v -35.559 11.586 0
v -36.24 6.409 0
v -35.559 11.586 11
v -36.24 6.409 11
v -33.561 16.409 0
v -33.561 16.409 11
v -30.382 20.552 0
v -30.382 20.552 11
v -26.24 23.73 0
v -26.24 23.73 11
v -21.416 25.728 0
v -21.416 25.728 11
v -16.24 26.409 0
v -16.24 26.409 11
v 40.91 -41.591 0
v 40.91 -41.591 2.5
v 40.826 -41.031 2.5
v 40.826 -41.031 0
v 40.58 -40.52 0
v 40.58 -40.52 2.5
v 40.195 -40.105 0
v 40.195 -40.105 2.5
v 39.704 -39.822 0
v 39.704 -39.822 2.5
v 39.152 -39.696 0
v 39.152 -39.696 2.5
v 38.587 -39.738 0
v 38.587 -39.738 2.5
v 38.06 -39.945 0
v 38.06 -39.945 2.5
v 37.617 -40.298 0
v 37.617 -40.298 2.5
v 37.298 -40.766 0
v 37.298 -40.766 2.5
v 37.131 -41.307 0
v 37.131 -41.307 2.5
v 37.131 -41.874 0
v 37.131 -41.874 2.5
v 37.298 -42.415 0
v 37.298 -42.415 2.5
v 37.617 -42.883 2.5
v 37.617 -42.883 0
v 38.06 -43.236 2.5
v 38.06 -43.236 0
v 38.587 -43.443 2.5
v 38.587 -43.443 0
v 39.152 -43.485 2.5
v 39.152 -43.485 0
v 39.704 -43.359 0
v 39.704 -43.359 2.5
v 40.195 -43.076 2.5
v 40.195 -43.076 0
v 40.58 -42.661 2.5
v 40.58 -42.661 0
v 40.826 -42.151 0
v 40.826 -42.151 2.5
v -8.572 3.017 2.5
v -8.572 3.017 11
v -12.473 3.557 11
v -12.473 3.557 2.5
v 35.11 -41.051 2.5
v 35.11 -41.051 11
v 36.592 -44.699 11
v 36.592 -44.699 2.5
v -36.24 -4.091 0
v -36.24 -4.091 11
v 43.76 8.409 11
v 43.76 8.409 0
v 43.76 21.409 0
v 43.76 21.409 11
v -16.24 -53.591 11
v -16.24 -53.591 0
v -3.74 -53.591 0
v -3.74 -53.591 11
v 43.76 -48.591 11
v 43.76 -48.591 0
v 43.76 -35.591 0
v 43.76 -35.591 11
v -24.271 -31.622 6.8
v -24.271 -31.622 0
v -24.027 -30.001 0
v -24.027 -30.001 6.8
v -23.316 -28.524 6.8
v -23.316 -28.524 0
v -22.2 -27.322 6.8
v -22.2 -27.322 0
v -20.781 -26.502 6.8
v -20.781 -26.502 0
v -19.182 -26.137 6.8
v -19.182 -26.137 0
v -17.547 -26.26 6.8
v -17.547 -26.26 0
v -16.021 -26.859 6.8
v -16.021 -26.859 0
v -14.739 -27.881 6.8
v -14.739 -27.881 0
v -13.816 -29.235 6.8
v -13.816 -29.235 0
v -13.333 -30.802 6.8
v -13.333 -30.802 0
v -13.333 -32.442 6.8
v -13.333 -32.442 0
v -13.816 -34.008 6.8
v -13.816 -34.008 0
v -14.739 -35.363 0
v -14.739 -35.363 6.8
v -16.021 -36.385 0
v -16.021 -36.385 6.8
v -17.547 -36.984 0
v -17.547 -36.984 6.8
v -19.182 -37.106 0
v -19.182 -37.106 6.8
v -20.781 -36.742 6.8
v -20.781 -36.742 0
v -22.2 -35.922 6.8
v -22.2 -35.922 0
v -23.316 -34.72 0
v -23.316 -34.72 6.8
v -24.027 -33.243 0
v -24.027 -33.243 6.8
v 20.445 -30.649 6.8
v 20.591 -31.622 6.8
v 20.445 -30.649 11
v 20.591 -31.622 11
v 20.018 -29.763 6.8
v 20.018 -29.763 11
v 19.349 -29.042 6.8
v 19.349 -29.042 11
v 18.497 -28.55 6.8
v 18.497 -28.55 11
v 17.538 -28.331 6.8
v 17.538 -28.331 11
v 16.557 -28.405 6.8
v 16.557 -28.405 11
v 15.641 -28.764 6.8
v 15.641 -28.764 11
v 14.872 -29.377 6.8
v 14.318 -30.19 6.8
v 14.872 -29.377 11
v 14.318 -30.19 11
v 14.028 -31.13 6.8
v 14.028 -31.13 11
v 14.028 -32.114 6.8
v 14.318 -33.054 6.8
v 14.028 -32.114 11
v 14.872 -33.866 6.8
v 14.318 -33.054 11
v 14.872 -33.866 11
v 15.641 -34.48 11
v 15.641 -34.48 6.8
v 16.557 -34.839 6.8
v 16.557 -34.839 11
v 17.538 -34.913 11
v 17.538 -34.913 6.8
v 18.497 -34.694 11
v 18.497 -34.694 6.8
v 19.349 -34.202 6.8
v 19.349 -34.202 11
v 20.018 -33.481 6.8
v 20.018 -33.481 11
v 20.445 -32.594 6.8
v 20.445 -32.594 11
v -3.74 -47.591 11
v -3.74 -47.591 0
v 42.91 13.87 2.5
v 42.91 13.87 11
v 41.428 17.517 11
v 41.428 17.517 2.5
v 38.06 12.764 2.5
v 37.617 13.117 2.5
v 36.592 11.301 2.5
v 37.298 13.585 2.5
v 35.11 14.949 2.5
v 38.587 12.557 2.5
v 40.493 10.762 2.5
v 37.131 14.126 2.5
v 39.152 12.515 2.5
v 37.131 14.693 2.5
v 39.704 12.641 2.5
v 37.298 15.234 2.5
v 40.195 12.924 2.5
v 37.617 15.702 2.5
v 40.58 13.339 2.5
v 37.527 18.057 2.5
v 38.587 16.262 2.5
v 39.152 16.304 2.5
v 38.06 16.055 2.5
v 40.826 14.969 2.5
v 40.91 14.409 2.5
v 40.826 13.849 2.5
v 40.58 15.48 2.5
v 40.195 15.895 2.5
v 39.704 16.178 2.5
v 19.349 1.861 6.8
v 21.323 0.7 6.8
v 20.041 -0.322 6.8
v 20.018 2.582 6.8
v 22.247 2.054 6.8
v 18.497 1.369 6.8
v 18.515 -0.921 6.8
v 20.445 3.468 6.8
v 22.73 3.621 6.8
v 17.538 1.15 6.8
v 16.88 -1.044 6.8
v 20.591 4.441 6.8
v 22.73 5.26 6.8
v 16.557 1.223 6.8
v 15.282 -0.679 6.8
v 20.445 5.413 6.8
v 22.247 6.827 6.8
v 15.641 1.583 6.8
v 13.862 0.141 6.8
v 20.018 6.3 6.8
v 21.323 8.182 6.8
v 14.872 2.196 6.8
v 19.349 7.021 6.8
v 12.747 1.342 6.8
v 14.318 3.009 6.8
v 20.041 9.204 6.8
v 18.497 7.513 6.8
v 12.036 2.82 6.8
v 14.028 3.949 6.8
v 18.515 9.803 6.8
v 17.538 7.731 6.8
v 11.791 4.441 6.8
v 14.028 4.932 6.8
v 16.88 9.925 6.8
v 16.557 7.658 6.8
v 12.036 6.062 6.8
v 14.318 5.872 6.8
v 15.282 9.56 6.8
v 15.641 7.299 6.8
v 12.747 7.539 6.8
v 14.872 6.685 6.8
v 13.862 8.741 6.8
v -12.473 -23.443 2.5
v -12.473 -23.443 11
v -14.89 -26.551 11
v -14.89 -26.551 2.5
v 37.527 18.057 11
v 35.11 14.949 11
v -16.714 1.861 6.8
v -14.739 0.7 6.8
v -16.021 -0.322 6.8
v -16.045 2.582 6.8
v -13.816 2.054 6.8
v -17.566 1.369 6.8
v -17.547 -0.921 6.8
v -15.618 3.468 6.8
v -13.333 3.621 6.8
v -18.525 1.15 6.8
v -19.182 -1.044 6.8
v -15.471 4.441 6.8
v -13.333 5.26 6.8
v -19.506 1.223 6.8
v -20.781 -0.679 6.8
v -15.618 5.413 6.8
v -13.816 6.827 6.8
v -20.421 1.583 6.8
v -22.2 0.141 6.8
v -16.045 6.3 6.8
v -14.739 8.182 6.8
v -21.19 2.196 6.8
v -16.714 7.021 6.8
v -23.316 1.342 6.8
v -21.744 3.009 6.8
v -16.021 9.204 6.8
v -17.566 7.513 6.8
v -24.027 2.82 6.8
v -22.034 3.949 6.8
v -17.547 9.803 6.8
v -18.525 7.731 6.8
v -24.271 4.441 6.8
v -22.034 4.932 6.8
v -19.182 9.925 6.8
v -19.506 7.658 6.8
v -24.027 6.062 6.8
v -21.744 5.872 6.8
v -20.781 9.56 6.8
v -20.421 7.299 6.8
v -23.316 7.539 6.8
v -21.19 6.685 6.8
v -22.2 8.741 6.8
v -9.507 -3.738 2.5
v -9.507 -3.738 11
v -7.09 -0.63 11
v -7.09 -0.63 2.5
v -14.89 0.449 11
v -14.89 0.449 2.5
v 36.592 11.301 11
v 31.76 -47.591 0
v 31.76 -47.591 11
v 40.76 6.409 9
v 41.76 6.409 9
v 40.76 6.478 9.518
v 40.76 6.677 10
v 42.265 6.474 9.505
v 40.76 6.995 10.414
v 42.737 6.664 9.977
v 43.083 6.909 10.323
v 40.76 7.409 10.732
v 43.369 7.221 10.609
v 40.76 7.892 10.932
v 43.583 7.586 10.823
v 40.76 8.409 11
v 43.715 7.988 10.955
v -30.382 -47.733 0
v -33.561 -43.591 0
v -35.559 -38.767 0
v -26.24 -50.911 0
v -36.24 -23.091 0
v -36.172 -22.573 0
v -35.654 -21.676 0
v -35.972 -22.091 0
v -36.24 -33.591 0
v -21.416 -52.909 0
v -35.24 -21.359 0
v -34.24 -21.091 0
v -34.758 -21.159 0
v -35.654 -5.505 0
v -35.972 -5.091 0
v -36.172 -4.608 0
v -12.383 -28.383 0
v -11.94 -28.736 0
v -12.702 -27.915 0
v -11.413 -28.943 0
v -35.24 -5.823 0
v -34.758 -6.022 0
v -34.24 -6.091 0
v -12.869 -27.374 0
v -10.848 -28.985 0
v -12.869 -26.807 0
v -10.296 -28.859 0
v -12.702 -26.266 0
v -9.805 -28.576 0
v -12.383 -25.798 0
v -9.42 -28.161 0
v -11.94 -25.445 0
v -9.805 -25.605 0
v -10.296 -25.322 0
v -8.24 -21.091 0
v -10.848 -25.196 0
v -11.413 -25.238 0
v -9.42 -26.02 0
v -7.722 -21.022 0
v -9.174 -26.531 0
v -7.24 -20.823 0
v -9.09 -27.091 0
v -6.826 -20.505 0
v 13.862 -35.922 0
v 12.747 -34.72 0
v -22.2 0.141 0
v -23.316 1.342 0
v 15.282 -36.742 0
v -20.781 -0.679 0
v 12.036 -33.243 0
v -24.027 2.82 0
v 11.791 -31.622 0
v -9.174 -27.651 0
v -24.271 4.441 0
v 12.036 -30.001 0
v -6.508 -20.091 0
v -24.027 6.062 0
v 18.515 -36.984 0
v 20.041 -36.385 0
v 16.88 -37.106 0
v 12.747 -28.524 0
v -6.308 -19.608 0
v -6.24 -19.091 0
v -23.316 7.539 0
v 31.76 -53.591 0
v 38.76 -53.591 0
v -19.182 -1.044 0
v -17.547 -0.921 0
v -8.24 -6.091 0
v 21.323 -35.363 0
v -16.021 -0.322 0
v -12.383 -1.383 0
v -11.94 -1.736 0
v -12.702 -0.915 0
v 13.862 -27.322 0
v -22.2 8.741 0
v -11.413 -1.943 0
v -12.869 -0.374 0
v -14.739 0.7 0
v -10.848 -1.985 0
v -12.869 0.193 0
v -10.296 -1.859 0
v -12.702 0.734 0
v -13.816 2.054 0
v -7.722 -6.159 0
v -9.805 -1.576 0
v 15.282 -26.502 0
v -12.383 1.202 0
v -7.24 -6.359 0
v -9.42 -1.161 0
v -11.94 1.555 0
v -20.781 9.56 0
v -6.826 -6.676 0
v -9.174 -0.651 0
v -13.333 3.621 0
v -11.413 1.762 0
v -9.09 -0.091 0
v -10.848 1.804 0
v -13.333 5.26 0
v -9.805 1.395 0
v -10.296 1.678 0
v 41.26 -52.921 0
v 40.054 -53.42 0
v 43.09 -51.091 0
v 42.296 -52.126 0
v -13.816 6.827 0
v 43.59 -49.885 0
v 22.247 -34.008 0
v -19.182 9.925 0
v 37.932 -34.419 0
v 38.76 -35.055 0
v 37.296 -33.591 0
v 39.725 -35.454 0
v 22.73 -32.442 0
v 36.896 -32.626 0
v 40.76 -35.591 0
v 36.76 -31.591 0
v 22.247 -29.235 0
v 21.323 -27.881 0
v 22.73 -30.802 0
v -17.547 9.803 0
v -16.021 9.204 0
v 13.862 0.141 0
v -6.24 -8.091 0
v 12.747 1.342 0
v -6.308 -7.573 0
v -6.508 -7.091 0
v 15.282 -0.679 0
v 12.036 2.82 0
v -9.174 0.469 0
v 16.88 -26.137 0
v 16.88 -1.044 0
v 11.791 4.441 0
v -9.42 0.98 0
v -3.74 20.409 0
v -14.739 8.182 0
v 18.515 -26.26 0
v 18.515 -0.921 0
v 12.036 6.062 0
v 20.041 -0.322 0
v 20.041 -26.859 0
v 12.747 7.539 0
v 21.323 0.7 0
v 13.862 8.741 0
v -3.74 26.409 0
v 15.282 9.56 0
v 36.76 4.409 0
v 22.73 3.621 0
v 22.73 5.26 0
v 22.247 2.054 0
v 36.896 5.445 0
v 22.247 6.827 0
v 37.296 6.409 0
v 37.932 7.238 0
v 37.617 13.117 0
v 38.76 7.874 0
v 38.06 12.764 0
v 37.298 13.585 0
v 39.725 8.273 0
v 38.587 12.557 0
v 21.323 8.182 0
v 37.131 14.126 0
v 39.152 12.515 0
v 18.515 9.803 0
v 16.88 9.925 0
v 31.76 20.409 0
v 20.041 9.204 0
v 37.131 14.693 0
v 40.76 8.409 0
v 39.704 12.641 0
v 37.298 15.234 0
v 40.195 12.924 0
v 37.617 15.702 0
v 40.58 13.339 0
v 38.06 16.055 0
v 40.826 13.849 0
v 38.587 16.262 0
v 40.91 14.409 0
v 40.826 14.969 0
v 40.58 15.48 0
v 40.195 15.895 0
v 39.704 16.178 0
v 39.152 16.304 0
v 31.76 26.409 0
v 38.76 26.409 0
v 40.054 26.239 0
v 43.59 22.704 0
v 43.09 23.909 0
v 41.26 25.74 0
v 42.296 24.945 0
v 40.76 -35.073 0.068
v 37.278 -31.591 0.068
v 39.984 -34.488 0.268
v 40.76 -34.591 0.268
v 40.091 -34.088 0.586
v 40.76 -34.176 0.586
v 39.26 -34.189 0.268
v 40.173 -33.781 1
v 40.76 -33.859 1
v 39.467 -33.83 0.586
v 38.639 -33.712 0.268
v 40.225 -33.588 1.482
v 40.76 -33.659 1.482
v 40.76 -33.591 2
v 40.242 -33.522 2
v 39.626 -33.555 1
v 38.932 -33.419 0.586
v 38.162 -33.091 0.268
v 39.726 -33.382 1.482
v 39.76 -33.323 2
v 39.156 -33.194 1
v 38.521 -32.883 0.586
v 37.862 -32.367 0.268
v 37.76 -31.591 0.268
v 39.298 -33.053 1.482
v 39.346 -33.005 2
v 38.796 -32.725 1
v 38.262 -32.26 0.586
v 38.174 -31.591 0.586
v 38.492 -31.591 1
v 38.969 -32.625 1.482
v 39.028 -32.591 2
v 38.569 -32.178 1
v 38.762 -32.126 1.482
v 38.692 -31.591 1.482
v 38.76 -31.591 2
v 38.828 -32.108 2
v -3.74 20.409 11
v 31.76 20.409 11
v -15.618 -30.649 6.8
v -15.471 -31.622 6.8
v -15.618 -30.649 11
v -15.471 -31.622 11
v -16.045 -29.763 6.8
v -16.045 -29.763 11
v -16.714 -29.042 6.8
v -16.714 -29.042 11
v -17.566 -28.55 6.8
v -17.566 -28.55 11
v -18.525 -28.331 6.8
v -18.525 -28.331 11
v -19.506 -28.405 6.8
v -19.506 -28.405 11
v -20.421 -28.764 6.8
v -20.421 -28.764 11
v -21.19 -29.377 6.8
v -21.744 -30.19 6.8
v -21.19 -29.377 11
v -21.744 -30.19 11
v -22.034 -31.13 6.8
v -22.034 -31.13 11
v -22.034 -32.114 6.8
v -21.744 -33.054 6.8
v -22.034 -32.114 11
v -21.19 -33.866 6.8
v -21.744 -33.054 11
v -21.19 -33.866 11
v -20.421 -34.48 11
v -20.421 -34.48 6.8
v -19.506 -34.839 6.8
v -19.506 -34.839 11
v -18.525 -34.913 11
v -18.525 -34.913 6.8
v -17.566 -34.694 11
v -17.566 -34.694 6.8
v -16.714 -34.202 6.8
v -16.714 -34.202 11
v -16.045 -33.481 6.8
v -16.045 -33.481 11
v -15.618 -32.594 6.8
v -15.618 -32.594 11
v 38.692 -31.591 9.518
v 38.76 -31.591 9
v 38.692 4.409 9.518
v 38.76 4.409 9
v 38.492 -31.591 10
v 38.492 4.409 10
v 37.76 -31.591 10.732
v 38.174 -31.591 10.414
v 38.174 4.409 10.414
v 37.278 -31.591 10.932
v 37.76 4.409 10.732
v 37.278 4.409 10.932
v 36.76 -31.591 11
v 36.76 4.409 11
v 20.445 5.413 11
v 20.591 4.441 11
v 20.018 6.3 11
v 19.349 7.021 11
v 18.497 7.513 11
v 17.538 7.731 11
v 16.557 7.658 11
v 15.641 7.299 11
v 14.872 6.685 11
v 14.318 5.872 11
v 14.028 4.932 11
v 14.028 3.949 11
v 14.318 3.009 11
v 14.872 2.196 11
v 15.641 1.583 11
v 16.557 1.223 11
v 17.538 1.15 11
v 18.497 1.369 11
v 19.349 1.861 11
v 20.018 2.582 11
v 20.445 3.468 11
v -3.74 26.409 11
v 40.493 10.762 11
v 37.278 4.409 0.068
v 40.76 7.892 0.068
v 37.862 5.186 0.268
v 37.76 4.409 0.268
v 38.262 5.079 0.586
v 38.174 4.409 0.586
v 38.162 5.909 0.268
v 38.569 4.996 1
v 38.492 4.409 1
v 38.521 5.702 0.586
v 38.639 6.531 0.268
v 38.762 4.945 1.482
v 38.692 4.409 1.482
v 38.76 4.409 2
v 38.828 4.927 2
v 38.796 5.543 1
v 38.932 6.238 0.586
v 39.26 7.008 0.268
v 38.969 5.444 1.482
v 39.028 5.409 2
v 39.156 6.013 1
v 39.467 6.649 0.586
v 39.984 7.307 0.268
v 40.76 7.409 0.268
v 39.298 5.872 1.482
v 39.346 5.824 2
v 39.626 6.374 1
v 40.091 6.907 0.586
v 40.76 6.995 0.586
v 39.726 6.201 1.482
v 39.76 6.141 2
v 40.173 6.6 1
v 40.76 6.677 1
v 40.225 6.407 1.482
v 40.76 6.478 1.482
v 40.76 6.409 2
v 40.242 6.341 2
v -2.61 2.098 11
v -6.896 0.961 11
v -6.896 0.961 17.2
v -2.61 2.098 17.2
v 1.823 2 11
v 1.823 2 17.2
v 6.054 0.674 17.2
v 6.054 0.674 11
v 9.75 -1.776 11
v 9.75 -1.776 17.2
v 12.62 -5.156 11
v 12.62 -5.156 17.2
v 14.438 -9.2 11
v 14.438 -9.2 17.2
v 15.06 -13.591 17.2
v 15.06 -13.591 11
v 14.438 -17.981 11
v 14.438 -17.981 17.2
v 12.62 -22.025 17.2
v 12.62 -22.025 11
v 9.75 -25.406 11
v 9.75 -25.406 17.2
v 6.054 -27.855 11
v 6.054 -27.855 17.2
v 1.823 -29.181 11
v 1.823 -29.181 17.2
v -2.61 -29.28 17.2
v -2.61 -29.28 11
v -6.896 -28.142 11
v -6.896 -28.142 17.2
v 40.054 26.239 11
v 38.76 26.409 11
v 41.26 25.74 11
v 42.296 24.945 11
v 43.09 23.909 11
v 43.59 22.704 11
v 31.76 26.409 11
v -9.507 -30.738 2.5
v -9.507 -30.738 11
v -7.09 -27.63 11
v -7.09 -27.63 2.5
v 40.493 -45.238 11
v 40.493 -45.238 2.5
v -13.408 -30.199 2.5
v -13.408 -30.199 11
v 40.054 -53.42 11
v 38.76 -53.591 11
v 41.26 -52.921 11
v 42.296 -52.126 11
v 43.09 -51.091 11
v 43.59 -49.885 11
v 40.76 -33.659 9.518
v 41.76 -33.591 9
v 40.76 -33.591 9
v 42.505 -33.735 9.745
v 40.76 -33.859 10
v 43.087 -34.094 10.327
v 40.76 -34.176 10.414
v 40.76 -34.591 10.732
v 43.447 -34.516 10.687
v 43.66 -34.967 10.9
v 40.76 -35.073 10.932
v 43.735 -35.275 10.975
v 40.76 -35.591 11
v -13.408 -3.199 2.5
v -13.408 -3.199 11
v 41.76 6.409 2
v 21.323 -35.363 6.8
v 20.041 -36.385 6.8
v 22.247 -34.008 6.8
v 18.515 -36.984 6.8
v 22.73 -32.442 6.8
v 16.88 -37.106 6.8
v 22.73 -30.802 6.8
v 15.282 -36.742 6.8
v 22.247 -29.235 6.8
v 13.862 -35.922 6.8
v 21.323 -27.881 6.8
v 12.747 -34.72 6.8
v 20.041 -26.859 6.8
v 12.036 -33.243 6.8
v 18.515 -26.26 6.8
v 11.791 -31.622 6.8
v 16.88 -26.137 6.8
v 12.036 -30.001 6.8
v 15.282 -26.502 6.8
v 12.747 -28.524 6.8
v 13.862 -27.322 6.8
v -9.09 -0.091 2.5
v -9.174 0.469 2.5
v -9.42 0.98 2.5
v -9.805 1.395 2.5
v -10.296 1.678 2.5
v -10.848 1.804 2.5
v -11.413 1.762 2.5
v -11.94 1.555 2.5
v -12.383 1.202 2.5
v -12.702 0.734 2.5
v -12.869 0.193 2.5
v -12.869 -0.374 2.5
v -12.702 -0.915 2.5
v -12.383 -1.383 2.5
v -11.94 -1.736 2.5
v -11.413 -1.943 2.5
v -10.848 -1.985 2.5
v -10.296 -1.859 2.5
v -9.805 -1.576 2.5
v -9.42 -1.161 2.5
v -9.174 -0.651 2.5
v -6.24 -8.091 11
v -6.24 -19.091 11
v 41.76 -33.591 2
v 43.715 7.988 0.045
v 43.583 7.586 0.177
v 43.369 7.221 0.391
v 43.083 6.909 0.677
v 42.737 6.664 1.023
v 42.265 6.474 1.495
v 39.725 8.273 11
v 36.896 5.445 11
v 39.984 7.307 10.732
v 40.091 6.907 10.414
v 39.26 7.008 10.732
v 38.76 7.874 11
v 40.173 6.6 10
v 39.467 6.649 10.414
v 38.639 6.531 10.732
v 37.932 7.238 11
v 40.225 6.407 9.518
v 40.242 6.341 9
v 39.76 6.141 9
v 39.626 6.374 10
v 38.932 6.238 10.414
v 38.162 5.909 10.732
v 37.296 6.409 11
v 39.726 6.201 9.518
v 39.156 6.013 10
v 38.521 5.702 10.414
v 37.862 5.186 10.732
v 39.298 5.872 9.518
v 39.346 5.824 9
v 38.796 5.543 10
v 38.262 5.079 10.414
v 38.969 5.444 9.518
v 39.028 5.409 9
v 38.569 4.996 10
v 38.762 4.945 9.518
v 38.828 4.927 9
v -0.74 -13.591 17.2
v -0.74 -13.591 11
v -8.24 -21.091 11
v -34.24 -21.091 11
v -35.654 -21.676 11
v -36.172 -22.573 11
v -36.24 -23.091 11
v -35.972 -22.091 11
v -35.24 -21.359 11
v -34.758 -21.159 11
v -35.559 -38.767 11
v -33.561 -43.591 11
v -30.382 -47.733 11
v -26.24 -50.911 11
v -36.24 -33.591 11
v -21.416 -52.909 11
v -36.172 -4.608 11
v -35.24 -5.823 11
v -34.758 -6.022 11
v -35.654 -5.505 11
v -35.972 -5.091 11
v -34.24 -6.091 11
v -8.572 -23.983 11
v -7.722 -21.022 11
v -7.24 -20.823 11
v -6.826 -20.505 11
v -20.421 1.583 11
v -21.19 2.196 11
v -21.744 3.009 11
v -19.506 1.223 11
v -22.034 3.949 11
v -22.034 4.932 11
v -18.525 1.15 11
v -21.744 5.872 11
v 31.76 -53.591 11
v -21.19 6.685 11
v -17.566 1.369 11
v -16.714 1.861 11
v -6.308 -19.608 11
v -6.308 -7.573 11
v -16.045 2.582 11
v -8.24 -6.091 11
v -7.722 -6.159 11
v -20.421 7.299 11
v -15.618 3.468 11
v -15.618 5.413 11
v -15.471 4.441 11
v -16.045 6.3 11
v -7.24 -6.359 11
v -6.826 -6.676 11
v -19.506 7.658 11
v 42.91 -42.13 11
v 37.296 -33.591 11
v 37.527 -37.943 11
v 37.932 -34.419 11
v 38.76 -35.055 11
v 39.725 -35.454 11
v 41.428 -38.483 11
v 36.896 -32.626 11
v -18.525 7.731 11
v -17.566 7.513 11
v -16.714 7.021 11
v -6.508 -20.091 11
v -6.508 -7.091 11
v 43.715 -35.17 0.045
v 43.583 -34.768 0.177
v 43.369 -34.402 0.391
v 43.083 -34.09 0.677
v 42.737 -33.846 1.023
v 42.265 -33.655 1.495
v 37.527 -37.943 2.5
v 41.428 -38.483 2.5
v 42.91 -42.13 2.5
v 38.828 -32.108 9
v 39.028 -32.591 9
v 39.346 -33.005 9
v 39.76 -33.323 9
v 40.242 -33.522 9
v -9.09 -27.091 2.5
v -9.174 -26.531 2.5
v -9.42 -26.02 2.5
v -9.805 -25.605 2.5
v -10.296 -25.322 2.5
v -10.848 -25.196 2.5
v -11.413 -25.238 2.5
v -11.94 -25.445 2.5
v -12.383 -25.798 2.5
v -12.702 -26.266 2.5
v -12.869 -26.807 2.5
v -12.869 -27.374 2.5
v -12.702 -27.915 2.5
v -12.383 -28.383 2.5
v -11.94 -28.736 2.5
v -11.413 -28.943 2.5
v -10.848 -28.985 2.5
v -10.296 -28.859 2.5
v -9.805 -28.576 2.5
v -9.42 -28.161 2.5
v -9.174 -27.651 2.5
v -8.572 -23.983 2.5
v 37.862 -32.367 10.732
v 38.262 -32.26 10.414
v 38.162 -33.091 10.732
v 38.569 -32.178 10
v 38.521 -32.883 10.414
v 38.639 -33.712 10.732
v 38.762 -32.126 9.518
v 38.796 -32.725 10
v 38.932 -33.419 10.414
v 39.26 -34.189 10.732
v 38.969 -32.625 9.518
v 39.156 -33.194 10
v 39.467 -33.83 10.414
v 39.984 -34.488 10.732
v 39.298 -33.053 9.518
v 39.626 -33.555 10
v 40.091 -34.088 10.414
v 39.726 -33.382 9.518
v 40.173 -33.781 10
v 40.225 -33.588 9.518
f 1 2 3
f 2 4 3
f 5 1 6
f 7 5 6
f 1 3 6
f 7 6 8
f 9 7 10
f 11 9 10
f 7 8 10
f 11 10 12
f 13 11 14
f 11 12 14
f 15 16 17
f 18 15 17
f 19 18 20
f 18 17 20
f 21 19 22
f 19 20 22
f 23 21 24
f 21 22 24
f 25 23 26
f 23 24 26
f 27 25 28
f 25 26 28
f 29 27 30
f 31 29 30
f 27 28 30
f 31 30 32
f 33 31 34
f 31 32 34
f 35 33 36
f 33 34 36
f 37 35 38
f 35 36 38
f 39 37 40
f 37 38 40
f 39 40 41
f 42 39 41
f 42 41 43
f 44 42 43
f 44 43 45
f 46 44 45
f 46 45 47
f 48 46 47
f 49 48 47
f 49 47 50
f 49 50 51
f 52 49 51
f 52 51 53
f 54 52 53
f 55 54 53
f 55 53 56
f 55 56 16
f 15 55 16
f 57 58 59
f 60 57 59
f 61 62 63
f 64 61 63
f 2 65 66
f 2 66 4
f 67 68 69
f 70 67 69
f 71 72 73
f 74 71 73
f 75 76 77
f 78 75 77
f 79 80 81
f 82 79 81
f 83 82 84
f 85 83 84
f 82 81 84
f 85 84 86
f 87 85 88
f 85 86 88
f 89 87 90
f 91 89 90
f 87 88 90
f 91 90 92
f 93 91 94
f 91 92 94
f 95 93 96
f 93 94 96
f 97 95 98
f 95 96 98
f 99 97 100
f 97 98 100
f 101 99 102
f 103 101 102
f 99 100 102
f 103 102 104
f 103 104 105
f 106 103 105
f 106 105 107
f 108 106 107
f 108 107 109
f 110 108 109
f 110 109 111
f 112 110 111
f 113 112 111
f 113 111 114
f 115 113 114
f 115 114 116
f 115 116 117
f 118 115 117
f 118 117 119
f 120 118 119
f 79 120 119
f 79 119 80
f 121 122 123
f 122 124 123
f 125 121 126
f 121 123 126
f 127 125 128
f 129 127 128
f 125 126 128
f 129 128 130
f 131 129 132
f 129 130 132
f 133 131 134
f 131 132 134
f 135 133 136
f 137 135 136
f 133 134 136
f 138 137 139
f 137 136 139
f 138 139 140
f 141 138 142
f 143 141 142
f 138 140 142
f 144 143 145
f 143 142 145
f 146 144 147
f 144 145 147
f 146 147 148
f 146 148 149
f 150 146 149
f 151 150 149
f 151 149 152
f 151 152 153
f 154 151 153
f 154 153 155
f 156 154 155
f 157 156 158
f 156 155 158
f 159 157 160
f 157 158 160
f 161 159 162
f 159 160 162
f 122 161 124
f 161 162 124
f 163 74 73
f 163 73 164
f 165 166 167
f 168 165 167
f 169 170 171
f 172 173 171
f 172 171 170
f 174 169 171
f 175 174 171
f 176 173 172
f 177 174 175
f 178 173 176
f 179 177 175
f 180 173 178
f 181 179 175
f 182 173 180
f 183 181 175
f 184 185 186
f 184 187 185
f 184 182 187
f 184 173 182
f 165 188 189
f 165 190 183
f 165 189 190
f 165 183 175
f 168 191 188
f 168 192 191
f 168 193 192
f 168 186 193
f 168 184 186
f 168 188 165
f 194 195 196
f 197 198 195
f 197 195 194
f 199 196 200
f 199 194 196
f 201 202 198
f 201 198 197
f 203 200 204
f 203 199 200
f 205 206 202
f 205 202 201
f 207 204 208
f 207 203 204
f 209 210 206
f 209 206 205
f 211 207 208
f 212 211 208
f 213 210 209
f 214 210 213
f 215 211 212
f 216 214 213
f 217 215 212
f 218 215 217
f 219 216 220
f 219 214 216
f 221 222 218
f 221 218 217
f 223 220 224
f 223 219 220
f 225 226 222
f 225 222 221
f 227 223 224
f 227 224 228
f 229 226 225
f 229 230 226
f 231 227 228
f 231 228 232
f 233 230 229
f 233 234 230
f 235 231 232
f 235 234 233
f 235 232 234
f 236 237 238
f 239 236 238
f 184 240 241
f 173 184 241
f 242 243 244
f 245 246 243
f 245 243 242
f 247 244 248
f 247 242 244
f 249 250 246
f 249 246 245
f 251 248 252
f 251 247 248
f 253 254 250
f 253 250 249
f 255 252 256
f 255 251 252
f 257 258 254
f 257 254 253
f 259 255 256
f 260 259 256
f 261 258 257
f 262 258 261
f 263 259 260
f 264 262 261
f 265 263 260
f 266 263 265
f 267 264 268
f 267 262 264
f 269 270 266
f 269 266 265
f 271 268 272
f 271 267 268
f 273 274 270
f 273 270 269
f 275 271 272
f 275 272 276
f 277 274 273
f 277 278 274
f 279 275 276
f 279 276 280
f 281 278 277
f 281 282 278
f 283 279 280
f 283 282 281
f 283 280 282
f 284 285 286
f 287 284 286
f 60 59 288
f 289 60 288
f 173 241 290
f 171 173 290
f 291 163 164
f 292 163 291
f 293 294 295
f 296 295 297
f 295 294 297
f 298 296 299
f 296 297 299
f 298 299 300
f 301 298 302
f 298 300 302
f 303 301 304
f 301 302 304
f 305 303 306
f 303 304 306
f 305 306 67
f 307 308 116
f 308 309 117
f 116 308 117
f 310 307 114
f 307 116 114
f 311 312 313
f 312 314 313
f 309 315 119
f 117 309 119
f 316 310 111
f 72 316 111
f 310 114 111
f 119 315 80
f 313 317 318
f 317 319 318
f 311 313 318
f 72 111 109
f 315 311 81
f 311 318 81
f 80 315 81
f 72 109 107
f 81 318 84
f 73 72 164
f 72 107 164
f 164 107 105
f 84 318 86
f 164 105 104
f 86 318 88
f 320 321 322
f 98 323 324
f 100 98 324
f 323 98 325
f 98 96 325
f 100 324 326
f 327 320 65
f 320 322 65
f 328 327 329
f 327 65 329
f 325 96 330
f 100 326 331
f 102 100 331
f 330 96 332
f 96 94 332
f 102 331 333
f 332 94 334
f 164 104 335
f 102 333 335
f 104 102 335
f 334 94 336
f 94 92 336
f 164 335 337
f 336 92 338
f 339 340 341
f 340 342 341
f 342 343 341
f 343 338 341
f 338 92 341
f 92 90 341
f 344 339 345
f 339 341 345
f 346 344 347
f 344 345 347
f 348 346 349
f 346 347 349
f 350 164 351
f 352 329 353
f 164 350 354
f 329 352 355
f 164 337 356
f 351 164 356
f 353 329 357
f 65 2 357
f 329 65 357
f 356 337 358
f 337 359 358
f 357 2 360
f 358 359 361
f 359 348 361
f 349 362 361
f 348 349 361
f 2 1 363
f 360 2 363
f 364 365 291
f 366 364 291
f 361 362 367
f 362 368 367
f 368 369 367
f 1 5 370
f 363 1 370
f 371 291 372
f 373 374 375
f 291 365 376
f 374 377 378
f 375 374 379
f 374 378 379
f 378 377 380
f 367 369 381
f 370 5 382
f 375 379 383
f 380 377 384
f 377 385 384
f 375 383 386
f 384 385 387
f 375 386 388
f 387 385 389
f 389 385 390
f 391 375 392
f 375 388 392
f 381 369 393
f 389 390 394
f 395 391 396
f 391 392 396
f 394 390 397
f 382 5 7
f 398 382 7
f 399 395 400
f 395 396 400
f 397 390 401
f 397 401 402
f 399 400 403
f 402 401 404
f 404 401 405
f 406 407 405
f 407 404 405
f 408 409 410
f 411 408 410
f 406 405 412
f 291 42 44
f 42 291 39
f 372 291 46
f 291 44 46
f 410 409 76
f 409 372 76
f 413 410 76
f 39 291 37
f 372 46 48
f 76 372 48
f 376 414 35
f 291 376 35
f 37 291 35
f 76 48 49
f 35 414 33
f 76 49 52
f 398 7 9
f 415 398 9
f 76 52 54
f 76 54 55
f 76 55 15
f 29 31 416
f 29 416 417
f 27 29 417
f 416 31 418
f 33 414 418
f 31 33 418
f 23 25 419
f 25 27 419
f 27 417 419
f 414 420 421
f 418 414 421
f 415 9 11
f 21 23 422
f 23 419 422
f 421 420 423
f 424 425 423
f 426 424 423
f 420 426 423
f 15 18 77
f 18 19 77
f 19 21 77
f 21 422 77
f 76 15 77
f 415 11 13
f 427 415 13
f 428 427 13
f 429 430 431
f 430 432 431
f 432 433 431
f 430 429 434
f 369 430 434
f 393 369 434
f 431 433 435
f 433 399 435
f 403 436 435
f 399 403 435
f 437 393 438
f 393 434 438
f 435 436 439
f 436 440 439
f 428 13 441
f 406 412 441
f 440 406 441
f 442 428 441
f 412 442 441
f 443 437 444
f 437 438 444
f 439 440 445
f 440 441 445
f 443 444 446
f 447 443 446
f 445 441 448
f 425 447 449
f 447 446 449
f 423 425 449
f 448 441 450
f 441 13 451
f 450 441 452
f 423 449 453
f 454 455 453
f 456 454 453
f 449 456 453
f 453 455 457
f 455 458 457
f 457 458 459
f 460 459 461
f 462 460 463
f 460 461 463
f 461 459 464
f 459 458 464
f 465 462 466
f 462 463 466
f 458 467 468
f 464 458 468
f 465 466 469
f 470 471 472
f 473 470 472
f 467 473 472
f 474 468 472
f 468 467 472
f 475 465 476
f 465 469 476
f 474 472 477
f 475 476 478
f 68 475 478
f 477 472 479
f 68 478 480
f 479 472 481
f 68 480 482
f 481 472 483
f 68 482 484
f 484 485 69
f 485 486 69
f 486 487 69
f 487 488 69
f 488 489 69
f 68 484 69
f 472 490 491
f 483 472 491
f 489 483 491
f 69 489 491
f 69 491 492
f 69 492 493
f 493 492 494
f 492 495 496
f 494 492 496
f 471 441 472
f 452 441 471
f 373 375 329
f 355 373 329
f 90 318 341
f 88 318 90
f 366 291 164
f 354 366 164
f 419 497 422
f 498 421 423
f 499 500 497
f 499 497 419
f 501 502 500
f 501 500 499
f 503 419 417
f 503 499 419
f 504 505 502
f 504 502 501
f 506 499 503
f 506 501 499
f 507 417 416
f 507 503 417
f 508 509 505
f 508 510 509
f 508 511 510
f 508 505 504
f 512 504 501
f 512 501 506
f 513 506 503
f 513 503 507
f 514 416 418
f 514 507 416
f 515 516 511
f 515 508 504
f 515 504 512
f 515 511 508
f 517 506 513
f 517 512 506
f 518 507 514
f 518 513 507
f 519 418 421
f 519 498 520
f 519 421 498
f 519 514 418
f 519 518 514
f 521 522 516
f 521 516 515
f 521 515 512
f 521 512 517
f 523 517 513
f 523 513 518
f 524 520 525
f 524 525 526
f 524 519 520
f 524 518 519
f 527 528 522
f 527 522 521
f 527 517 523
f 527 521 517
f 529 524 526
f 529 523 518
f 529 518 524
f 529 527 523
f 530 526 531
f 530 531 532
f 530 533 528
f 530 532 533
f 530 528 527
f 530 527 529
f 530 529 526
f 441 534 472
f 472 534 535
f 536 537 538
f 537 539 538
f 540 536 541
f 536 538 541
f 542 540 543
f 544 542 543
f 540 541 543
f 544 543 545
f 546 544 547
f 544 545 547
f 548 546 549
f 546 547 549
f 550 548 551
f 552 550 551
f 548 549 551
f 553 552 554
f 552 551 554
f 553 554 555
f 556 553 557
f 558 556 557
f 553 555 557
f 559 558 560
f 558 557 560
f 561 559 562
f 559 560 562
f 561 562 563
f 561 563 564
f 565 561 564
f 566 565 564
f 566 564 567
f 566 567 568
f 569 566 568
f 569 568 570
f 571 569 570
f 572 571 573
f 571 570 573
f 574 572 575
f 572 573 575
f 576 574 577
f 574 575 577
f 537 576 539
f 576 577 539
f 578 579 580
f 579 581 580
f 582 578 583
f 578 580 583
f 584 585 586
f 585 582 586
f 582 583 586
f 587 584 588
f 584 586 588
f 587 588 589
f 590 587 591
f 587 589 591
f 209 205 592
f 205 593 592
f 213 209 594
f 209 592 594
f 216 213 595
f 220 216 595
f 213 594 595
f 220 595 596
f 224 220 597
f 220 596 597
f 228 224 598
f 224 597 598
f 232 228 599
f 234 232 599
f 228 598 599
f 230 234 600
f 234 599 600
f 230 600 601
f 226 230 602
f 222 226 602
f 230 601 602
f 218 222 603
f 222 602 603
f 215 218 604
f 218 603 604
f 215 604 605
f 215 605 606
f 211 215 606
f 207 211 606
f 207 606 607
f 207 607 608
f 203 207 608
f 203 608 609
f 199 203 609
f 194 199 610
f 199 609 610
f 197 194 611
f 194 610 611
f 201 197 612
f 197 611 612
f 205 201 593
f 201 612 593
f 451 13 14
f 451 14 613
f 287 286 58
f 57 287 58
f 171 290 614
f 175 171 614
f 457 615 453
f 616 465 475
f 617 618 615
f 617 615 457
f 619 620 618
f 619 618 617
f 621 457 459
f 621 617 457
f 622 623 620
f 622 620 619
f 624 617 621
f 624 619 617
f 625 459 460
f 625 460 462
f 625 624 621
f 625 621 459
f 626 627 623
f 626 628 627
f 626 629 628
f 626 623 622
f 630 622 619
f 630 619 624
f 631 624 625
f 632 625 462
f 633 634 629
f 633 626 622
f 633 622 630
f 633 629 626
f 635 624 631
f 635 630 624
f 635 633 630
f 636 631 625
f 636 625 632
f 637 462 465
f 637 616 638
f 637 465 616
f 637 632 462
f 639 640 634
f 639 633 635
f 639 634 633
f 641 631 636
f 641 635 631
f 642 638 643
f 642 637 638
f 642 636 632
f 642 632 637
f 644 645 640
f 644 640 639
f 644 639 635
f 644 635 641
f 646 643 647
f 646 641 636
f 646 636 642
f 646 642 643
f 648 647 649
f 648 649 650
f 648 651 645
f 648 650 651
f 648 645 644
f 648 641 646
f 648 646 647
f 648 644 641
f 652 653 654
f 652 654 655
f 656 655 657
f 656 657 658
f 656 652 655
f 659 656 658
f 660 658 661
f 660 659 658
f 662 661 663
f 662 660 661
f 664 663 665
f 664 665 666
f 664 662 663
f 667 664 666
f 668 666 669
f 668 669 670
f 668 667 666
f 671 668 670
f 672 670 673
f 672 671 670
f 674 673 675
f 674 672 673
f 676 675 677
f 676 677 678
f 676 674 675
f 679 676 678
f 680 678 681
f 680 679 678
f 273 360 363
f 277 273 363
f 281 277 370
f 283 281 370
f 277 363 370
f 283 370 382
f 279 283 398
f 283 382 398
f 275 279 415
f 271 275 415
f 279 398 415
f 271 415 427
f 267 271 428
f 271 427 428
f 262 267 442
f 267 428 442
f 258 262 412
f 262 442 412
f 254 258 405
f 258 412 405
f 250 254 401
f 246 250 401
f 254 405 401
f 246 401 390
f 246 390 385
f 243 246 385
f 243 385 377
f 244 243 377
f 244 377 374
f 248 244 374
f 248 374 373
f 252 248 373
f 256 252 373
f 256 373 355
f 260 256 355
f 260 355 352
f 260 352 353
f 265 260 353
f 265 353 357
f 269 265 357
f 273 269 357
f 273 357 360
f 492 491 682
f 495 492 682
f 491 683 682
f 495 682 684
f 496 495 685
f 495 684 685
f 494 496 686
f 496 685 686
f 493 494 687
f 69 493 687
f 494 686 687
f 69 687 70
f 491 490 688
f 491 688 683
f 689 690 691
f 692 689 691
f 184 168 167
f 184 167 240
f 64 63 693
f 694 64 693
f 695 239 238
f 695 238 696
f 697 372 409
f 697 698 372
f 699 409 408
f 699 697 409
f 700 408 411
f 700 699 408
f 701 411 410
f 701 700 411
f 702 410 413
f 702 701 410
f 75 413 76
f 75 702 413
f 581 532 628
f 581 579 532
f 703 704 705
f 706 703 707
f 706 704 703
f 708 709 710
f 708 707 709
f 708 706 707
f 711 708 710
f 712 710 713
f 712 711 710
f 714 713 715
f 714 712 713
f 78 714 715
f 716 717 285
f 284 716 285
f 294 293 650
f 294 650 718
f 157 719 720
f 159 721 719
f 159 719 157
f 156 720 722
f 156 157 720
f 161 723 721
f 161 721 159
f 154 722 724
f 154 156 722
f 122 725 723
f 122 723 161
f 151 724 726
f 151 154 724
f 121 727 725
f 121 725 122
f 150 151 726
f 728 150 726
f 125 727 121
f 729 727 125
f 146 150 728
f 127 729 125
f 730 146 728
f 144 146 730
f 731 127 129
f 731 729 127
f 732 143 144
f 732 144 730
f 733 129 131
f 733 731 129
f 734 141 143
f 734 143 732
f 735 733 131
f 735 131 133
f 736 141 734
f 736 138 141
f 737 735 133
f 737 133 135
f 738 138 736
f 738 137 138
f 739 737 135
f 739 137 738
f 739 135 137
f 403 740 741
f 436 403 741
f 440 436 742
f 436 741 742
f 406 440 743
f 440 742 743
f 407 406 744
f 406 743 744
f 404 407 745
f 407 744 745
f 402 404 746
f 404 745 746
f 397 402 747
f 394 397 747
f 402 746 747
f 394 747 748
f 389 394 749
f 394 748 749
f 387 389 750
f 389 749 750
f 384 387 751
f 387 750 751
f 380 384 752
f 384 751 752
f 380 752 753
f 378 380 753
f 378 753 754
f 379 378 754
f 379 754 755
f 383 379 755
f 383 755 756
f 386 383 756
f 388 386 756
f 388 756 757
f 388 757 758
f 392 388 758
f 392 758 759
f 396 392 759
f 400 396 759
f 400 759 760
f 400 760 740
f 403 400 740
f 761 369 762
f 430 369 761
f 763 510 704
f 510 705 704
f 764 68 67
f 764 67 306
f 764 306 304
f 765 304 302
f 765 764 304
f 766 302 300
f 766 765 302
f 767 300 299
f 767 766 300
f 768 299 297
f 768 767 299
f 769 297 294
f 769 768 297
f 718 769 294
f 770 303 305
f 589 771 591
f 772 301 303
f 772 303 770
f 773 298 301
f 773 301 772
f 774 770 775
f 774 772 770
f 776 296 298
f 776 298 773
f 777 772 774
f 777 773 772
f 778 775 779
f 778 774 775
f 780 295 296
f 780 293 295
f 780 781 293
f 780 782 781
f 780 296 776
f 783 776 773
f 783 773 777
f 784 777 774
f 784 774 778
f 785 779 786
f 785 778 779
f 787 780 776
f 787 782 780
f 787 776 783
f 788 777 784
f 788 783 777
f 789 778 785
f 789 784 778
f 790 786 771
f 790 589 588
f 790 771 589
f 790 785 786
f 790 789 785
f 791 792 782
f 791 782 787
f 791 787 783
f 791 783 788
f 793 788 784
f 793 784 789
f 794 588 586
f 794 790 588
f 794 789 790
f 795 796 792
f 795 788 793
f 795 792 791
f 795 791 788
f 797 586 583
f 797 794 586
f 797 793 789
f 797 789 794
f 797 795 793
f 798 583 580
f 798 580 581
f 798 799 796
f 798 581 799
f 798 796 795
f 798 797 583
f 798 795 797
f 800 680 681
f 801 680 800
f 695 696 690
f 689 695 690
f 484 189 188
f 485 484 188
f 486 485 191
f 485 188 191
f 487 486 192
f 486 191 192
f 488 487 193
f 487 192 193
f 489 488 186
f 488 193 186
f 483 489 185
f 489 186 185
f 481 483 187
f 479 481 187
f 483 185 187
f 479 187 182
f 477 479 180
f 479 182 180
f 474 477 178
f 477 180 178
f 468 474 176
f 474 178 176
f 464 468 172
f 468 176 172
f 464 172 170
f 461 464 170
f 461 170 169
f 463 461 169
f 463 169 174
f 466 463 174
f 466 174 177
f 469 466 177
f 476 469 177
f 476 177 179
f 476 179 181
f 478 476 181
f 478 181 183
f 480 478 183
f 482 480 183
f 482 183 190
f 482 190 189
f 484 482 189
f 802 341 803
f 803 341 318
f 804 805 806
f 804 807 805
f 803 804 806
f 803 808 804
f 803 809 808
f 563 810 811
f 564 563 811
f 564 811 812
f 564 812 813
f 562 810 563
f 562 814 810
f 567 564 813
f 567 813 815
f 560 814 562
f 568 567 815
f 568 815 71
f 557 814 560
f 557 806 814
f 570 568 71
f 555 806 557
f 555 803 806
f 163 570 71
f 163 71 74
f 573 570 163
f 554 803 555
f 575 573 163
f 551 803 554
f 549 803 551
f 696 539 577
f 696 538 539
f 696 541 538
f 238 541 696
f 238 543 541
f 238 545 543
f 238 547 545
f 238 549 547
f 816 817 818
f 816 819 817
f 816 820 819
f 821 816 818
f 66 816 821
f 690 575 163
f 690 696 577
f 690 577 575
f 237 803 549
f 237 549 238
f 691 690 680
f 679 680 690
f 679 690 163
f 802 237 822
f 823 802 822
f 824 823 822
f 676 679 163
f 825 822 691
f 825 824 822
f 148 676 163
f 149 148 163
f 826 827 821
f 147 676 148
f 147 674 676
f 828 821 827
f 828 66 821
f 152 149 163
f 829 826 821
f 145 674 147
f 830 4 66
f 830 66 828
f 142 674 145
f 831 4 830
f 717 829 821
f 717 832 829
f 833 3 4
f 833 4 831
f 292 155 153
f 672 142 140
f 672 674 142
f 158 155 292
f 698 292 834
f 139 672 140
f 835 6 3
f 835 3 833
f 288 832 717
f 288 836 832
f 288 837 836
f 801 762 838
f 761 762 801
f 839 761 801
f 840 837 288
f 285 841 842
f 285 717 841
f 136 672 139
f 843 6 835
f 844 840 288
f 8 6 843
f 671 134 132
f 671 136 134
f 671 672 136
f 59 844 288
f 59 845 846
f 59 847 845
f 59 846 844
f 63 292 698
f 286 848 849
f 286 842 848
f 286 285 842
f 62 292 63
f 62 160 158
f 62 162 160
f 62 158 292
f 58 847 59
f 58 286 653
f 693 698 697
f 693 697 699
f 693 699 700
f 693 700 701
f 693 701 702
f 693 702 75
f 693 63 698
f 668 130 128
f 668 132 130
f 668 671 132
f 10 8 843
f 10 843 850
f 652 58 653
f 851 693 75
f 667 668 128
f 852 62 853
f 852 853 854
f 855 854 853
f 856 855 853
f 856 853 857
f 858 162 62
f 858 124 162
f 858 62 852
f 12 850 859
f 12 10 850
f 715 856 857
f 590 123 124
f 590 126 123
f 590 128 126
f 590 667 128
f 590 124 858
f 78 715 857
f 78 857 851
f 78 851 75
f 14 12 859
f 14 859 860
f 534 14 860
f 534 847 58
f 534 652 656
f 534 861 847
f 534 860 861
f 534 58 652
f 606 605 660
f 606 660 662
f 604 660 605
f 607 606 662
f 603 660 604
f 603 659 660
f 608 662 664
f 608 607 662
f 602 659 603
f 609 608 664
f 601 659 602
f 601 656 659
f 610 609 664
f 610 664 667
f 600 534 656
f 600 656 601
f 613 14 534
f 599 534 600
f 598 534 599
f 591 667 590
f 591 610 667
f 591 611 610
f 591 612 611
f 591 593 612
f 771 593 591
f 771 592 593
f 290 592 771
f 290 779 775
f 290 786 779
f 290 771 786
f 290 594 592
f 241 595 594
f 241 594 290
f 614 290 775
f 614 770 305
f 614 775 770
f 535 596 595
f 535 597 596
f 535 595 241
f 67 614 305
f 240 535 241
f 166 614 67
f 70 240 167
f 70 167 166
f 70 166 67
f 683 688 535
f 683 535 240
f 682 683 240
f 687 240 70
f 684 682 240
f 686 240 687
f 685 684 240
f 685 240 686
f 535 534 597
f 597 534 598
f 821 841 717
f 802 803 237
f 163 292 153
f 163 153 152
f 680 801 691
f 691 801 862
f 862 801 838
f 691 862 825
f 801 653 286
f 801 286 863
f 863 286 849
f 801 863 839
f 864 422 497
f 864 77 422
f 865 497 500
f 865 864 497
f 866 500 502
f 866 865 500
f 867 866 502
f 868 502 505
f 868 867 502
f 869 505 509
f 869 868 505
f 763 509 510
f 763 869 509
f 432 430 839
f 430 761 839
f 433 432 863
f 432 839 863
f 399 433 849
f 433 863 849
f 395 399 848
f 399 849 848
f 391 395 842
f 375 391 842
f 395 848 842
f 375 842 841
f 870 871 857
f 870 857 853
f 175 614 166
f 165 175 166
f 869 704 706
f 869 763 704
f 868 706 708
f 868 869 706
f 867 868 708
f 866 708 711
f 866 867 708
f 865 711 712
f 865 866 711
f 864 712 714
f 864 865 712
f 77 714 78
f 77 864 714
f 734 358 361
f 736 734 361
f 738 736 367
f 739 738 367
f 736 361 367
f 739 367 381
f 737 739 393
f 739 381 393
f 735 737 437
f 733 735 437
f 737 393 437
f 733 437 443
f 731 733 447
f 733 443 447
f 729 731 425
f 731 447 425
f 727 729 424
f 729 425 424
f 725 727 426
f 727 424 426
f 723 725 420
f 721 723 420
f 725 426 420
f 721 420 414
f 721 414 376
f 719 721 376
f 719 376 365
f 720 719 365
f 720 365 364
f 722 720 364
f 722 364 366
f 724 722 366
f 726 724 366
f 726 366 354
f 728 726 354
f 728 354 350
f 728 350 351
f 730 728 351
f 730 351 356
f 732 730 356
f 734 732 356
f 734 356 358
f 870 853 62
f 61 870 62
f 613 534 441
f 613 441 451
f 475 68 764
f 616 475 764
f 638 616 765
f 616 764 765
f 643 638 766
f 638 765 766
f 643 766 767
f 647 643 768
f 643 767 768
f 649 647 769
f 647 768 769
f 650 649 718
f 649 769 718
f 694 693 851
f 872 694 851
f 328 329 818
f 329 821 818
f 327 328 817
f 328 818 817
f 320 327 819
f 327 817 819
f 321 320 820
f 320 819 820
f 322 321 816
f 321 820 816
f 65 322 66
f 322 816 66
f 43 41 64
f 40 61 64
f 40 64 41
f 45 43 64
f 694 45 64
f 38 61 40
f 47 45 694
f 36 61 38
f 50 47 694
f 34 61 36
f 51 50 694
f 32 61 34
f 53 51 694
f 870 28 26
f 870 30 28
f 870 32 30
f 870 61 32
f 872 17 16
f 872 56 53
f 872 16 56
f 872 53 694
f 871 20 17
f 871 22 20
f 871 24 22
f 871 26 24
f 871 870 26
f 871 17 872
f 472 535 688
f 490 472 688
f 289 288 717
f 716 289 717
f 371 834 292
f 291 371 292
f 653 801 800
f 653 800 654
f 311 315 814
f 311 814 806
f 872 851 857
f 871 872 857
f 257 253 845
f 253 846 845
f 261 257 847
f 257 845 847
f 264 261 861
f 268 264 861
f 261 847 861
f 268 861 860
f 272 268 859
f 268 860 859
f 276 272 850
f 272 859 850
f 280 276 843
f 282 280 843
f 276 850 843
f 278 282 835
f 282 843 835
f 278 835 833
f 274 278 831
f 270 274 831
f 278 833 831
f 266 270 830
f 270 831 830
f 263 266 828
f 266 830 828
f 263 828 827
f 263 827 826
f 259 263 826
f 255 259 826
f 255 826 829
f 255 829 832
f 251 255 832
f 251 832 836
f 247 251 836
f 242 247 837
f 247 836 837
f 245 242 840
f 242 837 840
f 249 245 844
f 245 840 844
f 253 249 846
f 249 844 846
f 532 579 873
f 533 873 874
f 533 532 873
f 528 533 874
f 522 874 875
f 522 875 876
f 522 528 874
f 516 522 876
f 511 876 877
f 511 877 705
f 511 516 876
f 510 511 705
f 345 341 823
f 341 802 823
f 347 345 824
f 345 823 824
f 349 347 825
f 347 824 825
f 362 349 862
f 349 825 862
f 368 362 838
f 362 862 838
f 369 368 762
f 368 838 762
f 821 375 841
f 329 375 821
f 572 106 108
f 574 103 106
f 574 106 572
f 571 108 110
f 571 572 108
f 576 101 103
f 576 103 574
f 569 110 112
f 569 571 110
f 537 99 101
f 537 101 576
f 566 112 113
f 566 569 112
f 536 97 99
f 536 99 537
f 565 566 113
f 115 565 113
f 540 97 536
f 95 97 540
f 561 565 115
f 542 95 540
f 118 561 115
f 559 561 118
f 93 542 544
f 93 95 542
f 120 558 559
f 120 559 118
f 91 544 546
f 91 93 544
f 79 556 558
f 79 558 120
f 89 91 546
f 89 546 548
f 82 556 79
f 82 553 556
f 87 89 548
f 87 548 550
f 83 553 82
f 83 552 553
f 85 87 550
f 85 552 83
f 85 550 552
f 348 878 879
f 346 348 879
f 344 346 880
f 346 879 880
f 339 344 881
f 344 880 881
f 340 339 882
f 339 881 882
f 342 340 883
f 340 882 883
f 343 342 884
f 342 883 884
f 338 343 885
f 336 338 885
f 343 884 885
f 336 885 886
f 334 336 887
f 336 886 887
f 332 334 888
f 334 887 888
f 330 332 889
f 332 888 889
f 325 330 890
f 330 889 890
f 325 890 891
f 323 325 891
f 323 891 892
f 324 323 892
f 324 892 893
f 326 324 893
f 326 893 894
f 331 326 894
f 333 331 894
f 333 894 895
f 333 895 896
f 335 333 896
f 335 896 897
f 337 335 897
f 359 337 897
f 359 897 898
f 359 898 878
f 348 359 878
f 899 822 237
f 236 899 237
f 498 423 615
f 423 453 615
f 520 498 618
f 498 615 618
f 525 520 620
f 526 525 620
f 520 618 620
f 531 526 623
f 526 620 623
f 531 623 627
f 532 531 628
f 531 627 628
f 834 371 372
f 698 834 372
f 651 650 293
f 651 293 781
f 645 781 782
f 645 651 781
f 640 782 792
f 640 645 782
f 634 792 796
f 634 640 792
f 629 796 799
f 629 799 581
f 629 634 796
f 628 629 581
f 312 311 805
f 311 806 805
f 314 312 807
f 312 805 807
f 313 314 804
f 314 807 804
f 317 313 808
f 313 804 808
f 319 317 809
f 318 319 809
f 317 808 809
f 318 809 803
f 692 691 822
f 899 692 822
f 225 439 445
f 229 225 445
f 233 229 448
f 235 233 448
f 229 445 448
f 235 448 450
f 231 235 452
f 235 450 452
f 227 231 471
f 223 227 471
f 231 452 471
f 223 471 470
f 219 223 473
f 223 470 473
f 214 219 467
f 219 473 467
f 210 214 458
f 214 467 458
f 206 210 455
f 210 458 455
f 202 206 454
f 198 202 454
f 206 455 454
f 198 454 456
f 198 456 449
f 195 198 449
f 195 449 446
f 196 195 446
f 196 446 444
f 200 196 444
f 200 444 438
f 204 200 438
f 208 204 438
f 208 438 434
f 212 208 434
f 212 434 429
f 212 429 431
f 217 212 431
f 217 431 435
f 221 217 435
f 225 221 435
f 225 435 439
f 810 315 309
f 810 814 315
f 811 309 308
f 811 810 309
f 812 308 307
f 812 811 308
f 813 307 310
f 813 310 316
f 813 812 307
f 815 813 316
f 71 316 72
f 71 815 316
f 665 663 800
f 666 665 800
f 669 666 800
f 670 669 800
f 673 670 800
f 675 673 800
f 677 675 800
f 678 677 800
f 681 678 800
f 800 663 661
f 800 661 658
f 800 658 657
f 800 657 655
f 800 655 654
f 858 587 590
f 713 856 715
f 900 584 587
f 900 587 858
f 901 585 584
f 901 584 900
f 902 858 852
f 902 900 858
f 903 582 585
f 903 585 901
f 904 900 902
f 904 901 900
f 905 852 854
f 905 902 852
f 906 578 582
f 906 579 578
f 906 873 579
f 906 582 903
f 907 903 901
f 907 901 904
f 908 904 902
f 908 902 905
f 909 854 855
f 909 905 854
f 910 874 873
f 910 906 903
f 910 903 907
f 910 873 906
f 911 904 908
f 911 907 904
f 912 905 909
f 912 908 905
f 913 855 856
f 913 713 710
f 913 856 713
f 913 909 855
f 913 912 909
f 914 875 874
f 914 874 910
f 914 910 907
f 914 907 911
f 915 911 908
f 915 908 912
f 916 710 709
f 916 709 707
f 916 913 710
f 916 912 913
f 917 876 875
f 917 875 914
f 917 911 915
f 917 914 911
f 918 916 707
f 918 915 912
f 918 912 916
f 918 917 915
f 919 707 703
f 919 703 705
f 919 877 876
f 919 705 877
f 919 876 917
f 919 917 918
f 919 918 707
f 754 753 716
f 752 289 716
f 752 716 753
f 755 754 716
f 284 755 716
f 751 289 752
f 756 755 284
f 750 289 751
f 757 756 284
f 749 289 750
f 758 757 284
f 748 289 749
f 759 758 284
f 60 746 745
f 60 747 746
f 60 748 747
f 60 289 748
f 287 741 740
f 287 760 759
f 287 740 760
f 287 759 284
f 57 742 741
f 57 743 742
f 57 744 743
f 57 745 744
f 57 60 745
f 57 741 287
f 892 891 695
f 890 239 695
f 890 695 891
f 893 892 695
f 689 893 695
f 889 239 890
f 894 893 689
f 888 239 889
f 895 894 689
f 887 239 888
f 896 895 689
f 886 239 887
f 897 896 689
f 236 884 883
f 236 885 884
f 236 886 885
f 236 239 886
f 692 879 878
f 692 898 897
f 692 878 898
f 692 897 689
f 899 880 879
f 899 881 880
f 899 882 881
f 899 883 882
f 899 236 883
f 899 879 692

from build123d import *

# Parameters (mm, degrees)
SKETCH_1_W                = 80
SKETCH_1_H                = 80
EXTRUDE_1_DEPTH           = 11
FILLET_1_R                = 20
FILLET_2_R                = 5
SKETCH_2_W                = 30
SKETCH_2_H                = 15
CUT_EXTRUDE_1_DEPTH       = 11
FILLET_3_R                = 2
SKETCH_3_W                = 35.5
SKETCH_3_H                = 6
CUT_EXTRUDE_2_DEPTH       = 11
SKETCH_4_W                = 35.5
SKETCH_4_H                = 6
CUT_EXTRUDE_3_DEPTH       = 11
SKETCH_5_W                = 5
SKETCH_5_H                = 40
CUT_EXTRUDE_4_DEPTH       = 11
FILLET_4_R                = 2
SKETCH_8_R                = 1.9
CUT_EXTRUDE_5_DEPTH       = 11
CUT_EXTRUDE_6_DEPTH       = 8.5
EXTRUDE_2_DEPTH           = 6.2
HOLE_WIZARD_2_D           = 6.6
HOLE_WIZARD_2_CBORE_D     = 11
HOLE_WIZARD_2_CBORE_DEPTH = 6.8


with BuildPart() as part:
    # 草图1 → 凸台-拉伸1 (new body)
    with BuildSketch(Plane.XY):
        with Locations((3.759980536, -13.590563907)):
            Rectangle(SKETCH_1_W, SKETCH_1_H)
    extrude(amount=EXTRUDE_1_DEPTH)

    # 圆角1
    fillet_1_edges = [part.edges().sort_by_distance(p)[0] for p in [
        (-36.240019464, 26.409436093, 5.5),
        (-36.240019464, -53.590563907, 5.5),
    ]]
    fillet(fillet_1_edges, radius=FILLET_1_R)

    # 圆角2
    fillet_2_edges = [part.edges().sort_by_distance(p)[0] for p in [
        (43.759980536, 26.409436093, 5.5),
        (43.759980536, -53.590563907, 5.5),
    ]]
    fillet(fillet_2_edges, radius=FILLET_2_R)

    # 草图2 → 切除-拉伸1 (cut)
    with BuildSketch(Plane(origin=(0, 0, 0), x_dir=(-1, 0, 0), z_dir=(0, 0, -1))):
        with Locations((21.240019464, -13.590563907)):
            Rectangle(SKETCH_2_W, SKETCH_2_H)
    extrude(amount=-CUT_EXTRUDE_1_DEPTH, mode=Mode.SUBTRACT)

    # 圆角3
    fillet_3_edges = [part.edges().sort_by_distance(p)[0] for p in [
        (-36.240019464, -6.090563907, 5.5),
        (-36.240019464, -21.090563907, 5.5),
        (-6.240019464, -21.090563907, 5.5),
        (-6.240019464, -6.090563907, 5.5),
    ]]
    fillet(fillet_3_edges, radius=FILLET_3_R)

    # 草图3 → 切除-拉伸2 (cut)
    with BuildSketch(Plane.XY.offset(11)):
        with Locations((14.009980536, 23.409436093)):
            Rectangle(SKETCH_3_W, SKETCH_3_H)
    extrude(amount=-CUT_EXTRUDE_2_DEPTH, mode=Mode.SUBTRACT)

    # 草图4 → 切除-拉伸3 (cut)
    with BuildSketch(Plane.XY.offset(11)):
        with Locations((14.009980536, -50.590563907)):
            Rectangle(SKETCH_4_W, SKETCH_4_H)
    extrude(amount=-CUT_EXTRUDE_3_DEPTH, mode=Mode.SUBTRACT)

    # 草图5 → 切除-拉伸4 (cut)
    with BuildSketch(Plane.XY.offset(11)):
        with Locations((41.259980536, -13.590563907)):
            Rectangle(SKETCH_5_W, SKETCH_5_H)
    extrude(amount=-CUT_EXTRUDE_4_DEPTH, mode=Mode.SUBTRACT)

    # 圆角4
    fillet_4_edges = [part.edges().sort_by_distance(p)[0] for p in [
        (43.759980536, 6.409436093, 5.5),
        (41.259980536, -33.590563907, 0),
        (43.759980536, -33.590563907, 5.5),
        (38.759980536, -13.590563907, 0),
        (38.759980536, -33.590563907, 5.5),
        (41.259980536, 6.409436093, 0),
        (38.759980536, 6.409436093, 5.5),
        (41.259980536, 6.409436093, 11),
        (38.759980536, -13.590563907, 11),
        (41.259980536, -33.590563907, 11),
    ]]
    fillet(fillet_4_edges, radius=FILLET_4_R)

    # 草图8 → 切除-拉伸5 (cut)
    with BuildSketch(Plane.XY.offset(11)):
        with Locations((39.009980536, -41.590563907)):
            Circle(SKETCH_8_R)
        with Locations((-10.990019464, -27.090563907)):
            Circle(SKETCH_8_R)
        with Locations((-10.990019464, -0.090563907)):
            Circle(SKETCH_8_R)
        with Locations((39.009980536, 14.409436093)):
            Circle(SKETCH_8_R)
    extrude(amount=-CUT_EXTRUDE_5_DEPTH, mode=Mode.SUBTRACT)

    # 草图9 → 切除-拉伸6 (cut)
    with BuildSketch(Plane.XY.offset(11)):
        Polygon((-14.890383234, -26.550845651), (-13.40761107, -30.198518888), (-9.5072473, -30.738237144), (-7.089655694, -27.630282164), (-8.572427858, -23.982608927), (-12.472791628, -23.442890671), align=None)
        Polygon((37.527208372, -37.942890671), (35.109616766, -41.050845651), (36.59238893, -44.698518888), (40.4927527, -45.238237144), (42.910344306, -42.130282164), (41.427572142, -38.482608927), align=None)
        Polygon((-8.572427858, 3.017391073), (-12.472791628, 3.557109329), (-14.890383234, 0.449154349), (-13.40761107, -3.198518888), (-9.5072473, -3.738237144), (-7.089655694, -0.630282164), align=None)
        Polygon((36.59238893, 11.301481112), (40.4927527, 10.761762856), (42.910344306, 13.869717836), (41.427572142, 17.517391073), (37.527208372, 18.057109329), (35.109616766, 14.949154349), align=None)
    extrude(amount=-CUT_EXTRUDE_6_DEPTH, mode=Mode.SUBTRACT)

    # 草图10 → 凸台-拉伸2 (add)
    with BuildSketch(Plane.XY.offset(11)):
        with BuildLine():
            Line((-0.740019464, -13.590563907), (-6.895850028, 0.960922273))
            ThreePointArc((-6.895850028, 0.960922273), (15.059980536, -13.590563907), (-6.895850028, -28.142050088))
            Line((-6.895850028, -28.142050088), (-0.740019464, -13.590563907))
        make_face()
    extrude(amount=EXTRUDE_2_DEPTH)

    # 打孔尺寸(%根据)内六角圆柱头螺钉的类型2 (through all)
    with Locations(Plane(origin=(0, 0, 0), x_dir=(-1, 0, 0), z_dir=(0, 0, -1))):
        with Locations((-17.291203456, 4.440659013), (18.771242384, 4.440659013), (18.771242384, -31.621786828), (-17.291203456, -31.621786828)):
            CounterBoreHole(HOLE_WIZARD_2_D / 2, HOLE_WIZARD_2_CBORE_D / 2, HOLE_WIZARD_2_CBORE_DEPTH)


solid = part.part
